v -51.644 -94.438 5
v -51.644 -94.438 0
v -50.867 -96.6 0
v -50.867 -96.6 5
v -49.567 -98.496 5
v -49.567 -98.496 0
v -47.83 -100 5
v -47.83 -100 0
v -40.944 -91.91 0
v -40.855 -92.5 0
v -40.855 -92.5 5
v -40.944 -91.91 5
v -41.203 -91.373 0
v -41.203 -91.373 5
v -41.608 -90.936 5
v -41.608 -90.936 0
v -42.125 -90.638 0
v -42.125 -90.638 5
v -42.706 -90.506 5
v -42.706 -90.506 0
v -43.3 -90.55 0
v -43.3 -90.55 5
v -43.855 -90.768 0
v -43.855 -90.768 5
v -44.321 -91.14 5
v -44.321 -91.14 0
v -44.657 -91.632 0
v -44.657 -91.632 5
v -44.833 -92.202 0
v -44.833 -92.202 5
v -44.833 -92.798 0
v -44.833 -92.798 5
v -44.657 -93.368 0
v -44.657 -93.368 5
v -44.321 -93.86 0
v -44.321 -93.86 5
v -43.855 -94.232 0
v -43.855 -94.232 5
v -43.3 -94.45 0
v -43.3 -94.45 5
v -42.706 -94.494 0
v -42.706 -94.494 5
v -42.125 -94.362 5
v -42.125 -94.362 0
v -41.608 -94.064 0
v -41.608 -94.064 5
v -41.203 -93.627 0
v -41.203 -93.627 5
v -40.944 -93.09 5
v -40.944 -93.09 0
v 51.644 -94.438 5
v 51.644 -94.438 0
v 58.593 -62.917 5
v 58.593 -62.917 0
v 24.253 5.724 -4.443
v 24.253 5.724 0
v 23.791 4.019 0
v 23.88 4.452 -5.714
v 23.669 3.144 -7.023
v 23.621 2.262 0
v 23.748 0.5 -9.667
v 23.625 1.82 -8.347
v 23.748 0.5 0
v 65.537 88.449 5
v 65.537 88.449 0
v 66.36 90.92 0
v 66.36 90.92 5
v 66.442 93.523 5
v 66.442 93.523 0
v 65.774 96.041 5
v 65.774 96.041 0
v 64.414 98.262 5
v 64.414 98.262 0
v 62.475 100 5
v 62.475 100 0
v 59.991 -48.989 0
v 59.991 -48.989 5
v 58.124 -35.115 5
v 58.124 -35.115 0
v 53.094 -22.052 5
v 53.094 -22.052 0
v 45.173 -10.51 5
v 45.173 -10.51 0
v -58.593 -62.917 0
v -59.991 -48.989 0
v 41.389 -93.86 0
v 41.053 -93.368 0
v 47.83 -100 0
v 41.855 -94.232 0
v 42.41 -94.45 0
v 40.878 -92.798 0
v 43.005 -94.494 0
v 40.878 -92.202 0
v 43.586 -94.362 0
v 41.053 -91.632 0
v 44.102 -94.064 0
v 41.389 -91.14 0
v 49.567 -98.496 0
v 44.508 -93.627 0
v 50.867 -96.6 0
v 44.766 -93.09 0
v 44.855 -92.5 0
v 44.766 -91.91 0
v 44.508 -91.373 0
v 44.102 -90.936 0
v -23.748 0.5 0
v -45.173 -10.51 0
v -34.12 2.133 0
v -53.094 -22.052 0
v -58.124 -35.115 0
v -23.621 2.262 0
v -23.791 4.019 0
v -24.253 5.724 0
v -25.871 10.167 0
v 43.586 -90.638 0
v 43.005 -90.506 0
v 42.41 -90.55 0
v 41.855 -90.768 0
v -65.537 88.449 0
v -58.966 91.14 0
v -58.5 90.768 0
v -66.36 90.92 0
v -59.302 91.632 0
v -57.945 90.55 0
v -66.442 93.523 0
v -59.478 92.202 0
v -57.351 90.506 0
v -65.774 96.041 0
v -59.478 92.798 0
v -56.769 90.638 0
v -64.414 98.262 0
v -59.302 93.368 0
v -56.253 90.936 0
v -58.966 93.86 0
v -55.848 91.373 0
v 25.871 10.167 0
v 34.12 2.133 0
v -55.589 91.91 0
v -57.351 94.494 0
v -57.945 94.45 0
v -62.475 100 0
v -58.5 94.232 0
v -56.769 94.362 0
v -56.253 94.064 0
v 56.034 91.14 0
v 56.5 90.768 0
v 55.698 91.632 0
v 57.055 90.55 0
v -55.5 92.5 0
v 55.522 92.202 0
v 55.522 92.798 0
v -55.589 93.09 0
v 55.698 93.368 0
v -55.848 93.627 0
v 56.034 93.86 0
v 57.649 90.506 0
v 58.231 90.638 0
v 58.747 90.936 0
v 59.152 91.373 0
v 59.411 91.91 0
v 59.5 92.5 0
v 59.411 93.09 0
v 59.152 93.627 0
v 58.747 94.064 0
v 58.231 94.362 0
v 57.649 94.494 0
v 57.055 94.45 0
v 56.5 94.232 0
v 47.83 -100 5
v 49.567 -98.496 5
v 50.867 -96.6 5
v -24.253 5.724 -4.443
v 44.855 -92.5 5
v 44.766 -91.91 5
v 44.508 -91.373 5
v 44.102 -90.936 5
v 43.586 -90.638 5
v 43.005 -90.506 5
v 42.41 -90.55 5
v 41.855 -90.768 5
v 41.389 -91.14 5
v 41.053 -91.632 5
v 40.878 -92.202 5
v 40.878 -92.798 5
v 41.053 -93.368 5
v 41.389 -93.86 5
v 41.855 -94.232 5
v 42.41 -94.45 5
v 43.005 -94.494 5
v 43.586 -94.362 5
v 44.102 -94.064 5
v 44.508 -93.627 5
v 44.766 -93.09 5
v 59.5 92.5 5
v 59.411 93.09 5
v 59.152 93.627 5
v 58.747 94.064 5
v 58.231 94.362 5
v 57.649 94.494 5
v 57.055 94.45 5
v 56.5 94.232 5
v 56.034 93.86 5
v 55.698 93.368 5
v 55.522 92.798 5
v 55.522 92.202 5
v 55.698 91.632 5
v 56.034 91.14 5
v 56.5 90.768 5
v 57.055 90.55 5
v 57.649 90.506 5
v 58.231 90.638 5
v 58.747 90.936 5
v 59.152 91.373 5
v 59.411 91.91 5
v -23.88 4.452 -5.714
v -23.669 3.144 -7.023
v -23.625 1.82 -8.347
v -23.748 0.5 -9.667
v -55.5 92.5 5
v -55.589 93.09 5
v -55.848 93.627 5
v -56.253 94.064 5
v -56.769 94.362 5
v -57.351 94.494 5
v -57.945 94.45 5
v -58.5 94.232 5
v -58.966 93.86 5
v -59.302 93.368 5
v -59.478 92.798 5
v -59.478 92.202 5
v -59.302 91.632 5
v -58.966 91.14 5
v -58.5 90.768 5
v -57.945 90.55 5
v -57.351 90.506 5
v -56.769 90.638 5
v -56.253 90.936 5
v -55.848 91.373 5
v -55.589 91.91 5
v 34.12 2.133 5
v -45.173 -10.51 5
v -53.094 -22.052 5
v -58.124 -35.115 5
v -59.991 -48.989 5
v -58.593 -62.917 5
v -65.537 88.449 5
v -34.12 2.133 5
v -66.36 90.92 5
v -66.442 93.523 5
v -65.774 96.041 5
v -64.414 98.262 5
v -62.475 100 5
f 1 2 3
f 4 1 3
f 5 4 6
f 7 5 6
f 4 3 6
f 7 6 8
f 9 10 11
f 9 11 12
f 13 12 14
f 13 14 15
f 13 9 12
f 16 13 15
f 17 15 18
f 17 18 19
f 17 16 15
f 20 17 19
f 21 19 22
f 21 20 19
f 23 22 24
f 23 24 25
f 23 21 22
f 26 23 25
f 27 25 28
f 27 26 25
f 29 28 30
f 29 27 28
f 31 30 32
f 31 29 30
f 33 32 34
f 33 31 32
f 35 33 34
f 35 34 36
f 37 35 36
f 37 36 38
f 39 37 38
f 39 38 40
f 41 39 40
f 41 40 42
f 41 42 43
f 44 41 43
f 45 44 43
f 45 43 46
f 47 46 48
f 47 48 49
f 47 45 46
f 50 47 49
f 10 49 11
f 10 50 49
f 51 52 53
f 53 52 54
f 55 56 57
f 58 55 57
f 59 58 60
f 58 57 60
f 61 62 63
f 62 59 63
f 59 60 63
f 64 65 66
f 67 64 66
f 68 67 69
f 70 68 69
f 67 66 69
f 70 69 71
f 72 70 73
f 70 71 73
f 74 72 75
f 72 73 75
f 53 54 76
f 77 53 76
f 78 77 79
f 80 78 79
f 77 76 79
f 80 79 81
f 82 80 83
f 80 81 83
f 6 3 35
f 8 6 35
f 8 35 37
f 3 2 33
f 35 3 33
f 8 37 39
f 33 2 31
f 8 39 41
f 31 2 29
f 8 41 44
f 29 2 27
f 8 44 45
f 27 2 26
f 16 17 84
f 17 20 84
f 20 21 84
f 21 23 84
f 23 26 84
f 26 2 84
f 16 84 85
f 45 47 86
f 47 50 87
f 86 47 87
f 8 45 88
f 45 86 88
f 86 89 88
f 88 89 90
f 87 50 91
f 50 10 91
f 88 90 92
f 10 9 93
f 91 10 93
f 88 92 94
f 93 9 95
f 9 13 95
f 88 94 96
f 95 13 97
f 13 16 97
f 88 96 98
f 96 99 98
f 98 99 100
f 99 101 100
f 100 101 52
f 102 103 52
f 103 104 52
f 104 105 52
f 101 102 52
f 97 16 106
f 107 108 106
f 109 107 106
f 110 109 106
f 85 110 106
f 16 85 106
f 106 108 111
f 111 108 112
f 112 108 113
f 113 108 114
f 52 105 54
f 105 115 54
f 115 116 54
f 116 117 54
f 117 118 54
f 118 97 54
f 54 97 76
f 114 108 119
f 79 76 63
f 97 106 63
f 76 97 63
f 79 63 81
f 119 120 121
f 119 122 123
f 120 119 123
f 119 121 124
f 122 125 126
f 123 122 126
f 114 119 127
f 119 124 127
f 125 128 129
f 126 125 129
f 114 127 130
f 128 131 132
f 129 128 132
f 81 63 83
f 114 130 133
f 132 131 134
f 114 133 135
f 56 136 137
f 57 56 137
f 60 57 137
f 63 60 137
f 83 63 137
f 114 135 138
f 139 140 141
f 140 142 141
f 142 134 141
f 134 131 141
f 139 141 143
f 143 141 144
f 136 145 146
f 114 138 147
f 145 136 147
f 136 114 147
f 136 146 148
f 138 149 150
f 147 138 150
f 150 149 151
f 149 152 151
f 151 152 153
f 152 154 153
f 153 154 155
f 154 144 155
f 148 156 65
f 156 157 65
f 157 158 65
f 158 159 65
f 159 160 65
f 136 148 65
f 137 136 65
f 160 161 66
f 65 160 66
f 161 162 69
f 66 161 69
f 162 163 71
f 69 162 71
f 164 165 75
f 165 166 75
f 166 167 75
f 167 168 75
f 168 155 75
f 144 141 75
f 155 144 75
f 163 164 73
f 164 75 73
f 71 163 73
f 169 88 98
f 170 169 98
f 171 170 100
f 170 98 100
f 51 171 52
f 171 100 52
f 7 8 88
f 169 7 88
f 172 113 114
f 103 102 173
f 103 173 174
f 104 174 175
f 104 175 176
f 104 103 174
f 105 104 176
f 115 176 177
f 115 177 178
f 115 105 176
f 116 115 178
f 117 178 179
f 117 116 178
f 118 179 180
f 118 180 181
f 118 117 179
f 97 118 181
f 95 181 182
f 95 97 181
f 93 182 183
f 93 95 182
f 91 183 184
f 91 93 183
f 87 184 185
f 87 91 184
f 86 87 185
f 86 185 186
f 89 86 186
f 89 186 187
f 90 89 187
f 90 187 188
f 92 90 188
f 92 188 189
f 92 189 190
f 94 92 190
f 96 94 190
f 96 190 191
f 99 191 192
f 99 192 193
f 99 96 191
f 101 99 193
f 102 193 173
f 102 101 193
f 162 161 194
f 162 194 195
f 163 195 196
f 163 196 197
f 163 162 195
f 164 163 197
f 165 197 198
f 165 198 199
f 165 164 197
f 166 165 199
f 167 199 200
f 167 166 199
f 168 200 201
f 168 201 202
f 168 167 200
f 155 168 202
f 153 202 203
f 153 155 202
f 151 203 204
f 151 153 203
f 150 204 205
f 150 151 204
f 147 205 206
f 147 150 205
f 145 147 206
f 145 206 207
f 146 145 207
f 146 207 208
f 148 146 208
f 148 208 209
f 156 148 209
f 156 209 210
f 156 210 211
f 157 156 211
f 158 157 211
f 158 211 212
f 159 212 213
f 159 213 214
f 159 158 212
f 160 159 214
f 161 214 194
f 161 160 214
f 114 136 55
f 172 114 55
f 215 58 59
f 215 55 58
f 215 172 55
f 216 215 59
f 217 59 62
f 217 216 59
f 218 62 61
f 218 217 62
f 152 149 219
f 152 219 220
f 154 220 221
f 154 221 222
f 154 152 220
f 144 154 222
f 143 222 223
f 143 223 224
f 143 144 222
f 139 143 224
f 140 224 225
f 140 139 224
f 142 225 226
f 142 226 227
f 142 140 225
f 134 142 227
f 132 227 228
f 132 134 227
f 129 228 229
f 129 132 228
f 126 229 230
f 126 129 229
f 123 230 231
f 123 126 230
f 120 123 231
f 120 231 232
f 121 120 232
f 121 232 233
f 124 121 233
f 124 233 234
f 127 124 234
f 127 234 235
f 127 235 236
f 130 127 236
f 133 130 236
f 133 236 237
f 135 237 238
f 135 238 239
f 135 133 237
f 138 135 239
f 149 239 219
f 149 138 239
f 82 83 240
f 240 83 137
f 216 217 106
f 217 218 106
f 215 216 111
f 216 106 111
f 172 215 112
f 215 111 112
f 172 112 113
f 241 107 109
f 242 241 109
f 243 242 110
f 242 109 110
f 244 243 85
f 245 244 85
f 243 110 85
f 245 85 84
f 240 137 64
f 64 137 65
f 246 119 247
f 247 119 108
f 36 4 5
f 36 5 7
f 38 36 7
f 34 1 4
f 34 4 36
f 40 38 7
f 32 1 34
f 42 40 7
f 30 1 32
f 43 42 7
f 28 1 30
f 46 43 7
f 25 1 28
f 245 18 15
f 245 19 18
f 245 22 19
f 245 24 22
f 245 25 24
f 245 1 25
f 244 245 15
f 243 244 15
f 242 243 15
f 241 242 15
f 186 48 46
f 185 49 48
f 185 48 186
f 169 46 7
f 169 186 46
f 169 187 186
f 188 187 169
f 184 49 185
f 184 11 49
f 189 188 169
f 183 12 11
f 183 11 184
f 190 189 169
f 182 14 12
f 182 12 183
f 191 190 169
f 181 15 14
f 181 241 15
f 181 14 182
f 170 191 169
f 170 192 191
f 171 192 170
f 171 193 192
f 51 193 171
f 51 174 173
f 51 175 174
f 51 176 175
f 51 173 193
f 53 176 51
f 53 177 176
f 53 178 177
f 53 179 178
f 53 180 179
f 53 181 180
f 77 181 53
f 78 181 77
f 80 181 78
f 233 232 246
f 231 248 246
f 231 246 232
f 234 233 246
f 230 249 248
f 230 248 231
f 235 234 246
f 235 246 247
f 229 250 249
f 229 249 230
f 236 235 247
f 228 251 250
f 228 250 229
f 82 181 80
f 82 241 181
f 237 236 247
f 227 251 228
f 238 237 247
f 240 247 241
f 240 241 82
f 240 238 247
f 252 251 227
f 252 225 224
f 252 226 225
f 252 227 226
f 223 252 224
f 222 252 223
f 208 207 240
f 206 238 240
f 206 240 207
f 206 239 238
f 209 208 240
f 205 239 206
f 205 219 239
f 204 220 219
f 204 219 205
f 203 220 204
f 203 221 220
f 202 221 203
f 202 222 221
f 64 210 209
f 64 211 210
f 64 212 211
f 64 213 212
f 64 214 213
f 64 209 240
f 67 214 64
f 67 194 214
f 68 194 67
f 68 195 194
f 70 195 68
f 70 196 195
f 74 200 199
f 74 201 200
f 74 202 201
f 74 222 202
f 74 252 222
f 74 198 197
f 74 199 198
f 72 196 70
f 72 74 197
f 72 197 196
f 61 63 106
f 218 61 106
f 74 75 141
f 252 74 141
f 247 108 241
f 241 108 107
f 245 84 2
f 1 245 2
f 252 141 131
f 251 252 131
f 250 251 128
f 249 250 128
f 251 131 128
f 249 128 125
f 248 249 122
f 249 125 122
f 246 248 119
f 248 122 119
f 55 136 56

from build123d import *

# Parameters (mm, degrees)
SKETCH1_R           = 2
BOSS_EXTRUDE1_DEPTH = 5
BOSS_EXTRUDE2_DEPTH = 10
CHAMFER2_SIZE       = 10


with BuildPart() as part:
    # Sketch1 → Boss-Extrude1 (new body)
    with BuildSketch(Plane.XY):
        with BuildLine():
            ThreePointArc((58.593094964, -62.917012913), (58.124418815, -35.115379165), (45.172708428, -10.510426525))
            Line((45.172708428, -10.510426525), (34.120235365, 2.132661237))
            Line((34.120235365, 2.132661237), (65.536970349, 88.4494312))
            ThreePointArc((65.536970349, 88.4494312), (66.199502533, 94.806221081), (62.474937186, 100))
            Line((62.474937186, 100), (55, 100))
            Line((55, 100), (-55, 100))
            Line((-55, 100), (-62.474937186, 100))
            ThreePointArc((-62.474937186, 100), (-66.199502533, 94.806221081), (-65.536970349, 88.4494312))
            Line((-65.536970349, 88.4494312), (-34.120235365, 2.132661237))
            Line((-34.120235365, 2.132661237), (-45.172708428, -10.510426525))
            ThreePointArc((-45.172708428, -10.510426525), (-58.124418815, -35.115379165), (-58.593094964, -62.917012913))
            Line((-58.593094964, -62.917012913), (-51.644303304, -94.437551937))
            ThreePointArc((-51.644303304, -94.437551937), (-50.278037542, -97.589552755), (-47.830276245, -100))
            Line((-47.830276245, -100), (-40.355339059, -100))
            Line((-40.355339059, -100), (40.355339059, -100))
            Line((40.355339059, -100), (47.830276245, -100))
            ThreePointArc((47.830276245, -100), (50.278037542, -97.589552755), (51.644303304, -94.437551937))
            Line((51.644303304, -94.437551937), (58.593094964, -62.917012913))
        make_face()
        with Locations((-42.855339059, -92.5)):
            Circle(SKETCH1_R, mode=Mode.SUBTRACT)
        with Locations((42.855339059, -92.5)):
            Circle(SKETCH1_R, mode=Mode.SUBTRACT)
        with Locations((-57.5, 92.5)):
            Circle(SKETCH1_R, mode=Mode.SUBTRACT)
        with Locations((57.5, 92.5)):
            Circle(SKETCH1_R, mode=Mode.SUBTRACT)
    extrude(amount=BOSS_EXTRUDE1_DEPTH)

    # Sketch2 → Boss-Extrude2 (add)
    with BuildSketch(Plane(origin=(0, 0, 0), x_dir=(-1, 0, 0), z_dir=(0, 0, -1))):
        with BuildLine():
            Line((-25.870507592, 10.166666667), (-24.253462846, 5.723872742))
            ThreePointArc((-24.253462846, 5.723872742), (-23.669056818, 3.144030102), (-23.747944524, 0.5))
            Line((-23.747944524, 0.5), (23.747944524, 0.5))
            ThreePointArc((23.747944524, 0.5), (23.669056818, 3.144030102), (24.253462846, 5.723872742))
            Line((24.253462846, 5.723872742), (25.870507592, 10.166666667))
            Line((25.870507592, 10.166666667), (-25.870507592, 10.166666667))
        make_face()
    extrude(amount=BOSS_EXTRUDE2_DEPTH)

    # Chamfer2
    # the kernel refuses this chamfer: 10 mm, written as the material it takes off along each edge
    with BuildSketch(Plane(origin=(-51.587337472, 10.166666667, -10), x_dir=(0, 0.027495876610586317, 0.9996219169112968), z_dir=(1, 0, 0))) as chamfer2_piece_1_section:
        Polygon((CHAMFER2_SIZE * 0.999621916911, CHAMFER2_SIZE * 0.0274958766106), (-CHAMFER2_SIZE * 0.0274958766106, CHAMFER2_SIZE * 0.999621916911), (0, 0), align=None)
    chamfer2_piece_1 = extrude(amount=103.174674944, mode=Mode.PRIVATE)
    chamfer2_piece_1 = split(chamfer2_piece_1, bisect_by=Plane(origin=(0, 6.862625123, 0), z_dir=(0, 0, -1)), keep=Keep.TOP, mode=Mode.PRIVATE)
    add(chamfer2_piece_1, mode=Mode.SUBTRACT)


solid = part.part
